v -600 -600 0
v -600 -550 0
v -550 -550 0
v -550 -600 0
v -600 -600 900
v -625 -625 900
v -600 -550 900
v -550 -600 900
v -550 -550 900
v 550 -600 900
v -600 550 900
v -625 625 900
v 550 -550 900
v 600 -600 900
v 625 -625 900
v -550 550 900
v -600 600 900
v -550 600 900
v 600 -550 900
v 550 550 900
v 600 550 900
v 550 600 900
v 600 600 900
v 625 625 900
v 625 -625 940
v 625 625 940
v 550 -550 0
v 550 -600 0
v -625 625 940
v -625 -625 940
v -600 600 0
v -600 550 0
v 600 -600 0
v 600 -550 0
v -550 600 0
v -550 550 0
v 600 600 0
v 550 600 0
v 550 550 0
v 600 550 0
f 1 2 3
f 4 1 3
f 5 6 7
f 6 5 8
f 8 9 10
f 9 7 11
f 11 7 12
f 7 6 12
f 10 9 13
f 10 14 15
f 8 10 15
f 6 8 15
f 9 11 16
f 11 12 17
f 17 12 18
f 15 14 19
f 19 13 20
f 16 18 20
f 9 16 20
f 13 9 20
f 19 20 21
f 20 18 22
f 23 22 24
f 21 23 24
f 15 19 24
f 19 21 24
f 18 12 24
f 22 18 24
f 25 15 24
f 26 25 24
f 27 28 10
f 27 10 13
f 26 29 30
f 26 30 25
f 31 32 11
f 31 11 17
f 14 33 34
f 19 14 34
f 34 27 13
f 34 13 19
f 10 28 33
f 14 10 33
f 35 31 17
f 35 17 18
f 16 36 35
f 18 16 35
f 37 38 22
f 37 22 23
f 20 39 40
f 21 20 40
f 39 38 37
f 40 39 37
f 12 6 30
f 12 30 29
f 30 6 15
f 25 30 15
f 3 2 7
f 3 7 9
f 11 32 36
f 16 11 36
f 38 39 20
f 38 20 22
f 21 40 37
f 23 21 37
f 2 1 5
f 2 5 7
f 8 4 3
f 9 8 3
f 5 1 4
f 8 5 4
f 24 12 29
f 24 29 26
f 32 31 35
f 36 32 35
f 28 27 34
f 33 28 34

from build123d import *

# Parameters (mm, degrees)
F0_W     = 50
F0_H     = 50
F1_DEPTH = 900
F2_W     = 1250
F2_H     = 1250
F3_DEPTH = 40


with BuildPart() as f1:
    # F0 (on Top) → F1 (new body)
    with BuildSketch(Plane.XY):
        with Locations((-575, 575)):
            Rectangle(F0_W, F0_H)
        with Locations((575, 575)):
            Rectangle(F0_W, F0_H)
        with Locations((575, -575)):
            Rectangle(F0_W, F0_H)
        with Locations((-575, -575)):
            Rectangle(F0_W, F0_H)
    extrude(amount=F1_DEPTH)

    # F2 (on face) → F3 (join)
    with BuildSketch(Plane.XY.offset(900)):
        Rectangle(F2_W, F2_H)
    extrude(amount=F3_DEPTH)


solid = f1.part
